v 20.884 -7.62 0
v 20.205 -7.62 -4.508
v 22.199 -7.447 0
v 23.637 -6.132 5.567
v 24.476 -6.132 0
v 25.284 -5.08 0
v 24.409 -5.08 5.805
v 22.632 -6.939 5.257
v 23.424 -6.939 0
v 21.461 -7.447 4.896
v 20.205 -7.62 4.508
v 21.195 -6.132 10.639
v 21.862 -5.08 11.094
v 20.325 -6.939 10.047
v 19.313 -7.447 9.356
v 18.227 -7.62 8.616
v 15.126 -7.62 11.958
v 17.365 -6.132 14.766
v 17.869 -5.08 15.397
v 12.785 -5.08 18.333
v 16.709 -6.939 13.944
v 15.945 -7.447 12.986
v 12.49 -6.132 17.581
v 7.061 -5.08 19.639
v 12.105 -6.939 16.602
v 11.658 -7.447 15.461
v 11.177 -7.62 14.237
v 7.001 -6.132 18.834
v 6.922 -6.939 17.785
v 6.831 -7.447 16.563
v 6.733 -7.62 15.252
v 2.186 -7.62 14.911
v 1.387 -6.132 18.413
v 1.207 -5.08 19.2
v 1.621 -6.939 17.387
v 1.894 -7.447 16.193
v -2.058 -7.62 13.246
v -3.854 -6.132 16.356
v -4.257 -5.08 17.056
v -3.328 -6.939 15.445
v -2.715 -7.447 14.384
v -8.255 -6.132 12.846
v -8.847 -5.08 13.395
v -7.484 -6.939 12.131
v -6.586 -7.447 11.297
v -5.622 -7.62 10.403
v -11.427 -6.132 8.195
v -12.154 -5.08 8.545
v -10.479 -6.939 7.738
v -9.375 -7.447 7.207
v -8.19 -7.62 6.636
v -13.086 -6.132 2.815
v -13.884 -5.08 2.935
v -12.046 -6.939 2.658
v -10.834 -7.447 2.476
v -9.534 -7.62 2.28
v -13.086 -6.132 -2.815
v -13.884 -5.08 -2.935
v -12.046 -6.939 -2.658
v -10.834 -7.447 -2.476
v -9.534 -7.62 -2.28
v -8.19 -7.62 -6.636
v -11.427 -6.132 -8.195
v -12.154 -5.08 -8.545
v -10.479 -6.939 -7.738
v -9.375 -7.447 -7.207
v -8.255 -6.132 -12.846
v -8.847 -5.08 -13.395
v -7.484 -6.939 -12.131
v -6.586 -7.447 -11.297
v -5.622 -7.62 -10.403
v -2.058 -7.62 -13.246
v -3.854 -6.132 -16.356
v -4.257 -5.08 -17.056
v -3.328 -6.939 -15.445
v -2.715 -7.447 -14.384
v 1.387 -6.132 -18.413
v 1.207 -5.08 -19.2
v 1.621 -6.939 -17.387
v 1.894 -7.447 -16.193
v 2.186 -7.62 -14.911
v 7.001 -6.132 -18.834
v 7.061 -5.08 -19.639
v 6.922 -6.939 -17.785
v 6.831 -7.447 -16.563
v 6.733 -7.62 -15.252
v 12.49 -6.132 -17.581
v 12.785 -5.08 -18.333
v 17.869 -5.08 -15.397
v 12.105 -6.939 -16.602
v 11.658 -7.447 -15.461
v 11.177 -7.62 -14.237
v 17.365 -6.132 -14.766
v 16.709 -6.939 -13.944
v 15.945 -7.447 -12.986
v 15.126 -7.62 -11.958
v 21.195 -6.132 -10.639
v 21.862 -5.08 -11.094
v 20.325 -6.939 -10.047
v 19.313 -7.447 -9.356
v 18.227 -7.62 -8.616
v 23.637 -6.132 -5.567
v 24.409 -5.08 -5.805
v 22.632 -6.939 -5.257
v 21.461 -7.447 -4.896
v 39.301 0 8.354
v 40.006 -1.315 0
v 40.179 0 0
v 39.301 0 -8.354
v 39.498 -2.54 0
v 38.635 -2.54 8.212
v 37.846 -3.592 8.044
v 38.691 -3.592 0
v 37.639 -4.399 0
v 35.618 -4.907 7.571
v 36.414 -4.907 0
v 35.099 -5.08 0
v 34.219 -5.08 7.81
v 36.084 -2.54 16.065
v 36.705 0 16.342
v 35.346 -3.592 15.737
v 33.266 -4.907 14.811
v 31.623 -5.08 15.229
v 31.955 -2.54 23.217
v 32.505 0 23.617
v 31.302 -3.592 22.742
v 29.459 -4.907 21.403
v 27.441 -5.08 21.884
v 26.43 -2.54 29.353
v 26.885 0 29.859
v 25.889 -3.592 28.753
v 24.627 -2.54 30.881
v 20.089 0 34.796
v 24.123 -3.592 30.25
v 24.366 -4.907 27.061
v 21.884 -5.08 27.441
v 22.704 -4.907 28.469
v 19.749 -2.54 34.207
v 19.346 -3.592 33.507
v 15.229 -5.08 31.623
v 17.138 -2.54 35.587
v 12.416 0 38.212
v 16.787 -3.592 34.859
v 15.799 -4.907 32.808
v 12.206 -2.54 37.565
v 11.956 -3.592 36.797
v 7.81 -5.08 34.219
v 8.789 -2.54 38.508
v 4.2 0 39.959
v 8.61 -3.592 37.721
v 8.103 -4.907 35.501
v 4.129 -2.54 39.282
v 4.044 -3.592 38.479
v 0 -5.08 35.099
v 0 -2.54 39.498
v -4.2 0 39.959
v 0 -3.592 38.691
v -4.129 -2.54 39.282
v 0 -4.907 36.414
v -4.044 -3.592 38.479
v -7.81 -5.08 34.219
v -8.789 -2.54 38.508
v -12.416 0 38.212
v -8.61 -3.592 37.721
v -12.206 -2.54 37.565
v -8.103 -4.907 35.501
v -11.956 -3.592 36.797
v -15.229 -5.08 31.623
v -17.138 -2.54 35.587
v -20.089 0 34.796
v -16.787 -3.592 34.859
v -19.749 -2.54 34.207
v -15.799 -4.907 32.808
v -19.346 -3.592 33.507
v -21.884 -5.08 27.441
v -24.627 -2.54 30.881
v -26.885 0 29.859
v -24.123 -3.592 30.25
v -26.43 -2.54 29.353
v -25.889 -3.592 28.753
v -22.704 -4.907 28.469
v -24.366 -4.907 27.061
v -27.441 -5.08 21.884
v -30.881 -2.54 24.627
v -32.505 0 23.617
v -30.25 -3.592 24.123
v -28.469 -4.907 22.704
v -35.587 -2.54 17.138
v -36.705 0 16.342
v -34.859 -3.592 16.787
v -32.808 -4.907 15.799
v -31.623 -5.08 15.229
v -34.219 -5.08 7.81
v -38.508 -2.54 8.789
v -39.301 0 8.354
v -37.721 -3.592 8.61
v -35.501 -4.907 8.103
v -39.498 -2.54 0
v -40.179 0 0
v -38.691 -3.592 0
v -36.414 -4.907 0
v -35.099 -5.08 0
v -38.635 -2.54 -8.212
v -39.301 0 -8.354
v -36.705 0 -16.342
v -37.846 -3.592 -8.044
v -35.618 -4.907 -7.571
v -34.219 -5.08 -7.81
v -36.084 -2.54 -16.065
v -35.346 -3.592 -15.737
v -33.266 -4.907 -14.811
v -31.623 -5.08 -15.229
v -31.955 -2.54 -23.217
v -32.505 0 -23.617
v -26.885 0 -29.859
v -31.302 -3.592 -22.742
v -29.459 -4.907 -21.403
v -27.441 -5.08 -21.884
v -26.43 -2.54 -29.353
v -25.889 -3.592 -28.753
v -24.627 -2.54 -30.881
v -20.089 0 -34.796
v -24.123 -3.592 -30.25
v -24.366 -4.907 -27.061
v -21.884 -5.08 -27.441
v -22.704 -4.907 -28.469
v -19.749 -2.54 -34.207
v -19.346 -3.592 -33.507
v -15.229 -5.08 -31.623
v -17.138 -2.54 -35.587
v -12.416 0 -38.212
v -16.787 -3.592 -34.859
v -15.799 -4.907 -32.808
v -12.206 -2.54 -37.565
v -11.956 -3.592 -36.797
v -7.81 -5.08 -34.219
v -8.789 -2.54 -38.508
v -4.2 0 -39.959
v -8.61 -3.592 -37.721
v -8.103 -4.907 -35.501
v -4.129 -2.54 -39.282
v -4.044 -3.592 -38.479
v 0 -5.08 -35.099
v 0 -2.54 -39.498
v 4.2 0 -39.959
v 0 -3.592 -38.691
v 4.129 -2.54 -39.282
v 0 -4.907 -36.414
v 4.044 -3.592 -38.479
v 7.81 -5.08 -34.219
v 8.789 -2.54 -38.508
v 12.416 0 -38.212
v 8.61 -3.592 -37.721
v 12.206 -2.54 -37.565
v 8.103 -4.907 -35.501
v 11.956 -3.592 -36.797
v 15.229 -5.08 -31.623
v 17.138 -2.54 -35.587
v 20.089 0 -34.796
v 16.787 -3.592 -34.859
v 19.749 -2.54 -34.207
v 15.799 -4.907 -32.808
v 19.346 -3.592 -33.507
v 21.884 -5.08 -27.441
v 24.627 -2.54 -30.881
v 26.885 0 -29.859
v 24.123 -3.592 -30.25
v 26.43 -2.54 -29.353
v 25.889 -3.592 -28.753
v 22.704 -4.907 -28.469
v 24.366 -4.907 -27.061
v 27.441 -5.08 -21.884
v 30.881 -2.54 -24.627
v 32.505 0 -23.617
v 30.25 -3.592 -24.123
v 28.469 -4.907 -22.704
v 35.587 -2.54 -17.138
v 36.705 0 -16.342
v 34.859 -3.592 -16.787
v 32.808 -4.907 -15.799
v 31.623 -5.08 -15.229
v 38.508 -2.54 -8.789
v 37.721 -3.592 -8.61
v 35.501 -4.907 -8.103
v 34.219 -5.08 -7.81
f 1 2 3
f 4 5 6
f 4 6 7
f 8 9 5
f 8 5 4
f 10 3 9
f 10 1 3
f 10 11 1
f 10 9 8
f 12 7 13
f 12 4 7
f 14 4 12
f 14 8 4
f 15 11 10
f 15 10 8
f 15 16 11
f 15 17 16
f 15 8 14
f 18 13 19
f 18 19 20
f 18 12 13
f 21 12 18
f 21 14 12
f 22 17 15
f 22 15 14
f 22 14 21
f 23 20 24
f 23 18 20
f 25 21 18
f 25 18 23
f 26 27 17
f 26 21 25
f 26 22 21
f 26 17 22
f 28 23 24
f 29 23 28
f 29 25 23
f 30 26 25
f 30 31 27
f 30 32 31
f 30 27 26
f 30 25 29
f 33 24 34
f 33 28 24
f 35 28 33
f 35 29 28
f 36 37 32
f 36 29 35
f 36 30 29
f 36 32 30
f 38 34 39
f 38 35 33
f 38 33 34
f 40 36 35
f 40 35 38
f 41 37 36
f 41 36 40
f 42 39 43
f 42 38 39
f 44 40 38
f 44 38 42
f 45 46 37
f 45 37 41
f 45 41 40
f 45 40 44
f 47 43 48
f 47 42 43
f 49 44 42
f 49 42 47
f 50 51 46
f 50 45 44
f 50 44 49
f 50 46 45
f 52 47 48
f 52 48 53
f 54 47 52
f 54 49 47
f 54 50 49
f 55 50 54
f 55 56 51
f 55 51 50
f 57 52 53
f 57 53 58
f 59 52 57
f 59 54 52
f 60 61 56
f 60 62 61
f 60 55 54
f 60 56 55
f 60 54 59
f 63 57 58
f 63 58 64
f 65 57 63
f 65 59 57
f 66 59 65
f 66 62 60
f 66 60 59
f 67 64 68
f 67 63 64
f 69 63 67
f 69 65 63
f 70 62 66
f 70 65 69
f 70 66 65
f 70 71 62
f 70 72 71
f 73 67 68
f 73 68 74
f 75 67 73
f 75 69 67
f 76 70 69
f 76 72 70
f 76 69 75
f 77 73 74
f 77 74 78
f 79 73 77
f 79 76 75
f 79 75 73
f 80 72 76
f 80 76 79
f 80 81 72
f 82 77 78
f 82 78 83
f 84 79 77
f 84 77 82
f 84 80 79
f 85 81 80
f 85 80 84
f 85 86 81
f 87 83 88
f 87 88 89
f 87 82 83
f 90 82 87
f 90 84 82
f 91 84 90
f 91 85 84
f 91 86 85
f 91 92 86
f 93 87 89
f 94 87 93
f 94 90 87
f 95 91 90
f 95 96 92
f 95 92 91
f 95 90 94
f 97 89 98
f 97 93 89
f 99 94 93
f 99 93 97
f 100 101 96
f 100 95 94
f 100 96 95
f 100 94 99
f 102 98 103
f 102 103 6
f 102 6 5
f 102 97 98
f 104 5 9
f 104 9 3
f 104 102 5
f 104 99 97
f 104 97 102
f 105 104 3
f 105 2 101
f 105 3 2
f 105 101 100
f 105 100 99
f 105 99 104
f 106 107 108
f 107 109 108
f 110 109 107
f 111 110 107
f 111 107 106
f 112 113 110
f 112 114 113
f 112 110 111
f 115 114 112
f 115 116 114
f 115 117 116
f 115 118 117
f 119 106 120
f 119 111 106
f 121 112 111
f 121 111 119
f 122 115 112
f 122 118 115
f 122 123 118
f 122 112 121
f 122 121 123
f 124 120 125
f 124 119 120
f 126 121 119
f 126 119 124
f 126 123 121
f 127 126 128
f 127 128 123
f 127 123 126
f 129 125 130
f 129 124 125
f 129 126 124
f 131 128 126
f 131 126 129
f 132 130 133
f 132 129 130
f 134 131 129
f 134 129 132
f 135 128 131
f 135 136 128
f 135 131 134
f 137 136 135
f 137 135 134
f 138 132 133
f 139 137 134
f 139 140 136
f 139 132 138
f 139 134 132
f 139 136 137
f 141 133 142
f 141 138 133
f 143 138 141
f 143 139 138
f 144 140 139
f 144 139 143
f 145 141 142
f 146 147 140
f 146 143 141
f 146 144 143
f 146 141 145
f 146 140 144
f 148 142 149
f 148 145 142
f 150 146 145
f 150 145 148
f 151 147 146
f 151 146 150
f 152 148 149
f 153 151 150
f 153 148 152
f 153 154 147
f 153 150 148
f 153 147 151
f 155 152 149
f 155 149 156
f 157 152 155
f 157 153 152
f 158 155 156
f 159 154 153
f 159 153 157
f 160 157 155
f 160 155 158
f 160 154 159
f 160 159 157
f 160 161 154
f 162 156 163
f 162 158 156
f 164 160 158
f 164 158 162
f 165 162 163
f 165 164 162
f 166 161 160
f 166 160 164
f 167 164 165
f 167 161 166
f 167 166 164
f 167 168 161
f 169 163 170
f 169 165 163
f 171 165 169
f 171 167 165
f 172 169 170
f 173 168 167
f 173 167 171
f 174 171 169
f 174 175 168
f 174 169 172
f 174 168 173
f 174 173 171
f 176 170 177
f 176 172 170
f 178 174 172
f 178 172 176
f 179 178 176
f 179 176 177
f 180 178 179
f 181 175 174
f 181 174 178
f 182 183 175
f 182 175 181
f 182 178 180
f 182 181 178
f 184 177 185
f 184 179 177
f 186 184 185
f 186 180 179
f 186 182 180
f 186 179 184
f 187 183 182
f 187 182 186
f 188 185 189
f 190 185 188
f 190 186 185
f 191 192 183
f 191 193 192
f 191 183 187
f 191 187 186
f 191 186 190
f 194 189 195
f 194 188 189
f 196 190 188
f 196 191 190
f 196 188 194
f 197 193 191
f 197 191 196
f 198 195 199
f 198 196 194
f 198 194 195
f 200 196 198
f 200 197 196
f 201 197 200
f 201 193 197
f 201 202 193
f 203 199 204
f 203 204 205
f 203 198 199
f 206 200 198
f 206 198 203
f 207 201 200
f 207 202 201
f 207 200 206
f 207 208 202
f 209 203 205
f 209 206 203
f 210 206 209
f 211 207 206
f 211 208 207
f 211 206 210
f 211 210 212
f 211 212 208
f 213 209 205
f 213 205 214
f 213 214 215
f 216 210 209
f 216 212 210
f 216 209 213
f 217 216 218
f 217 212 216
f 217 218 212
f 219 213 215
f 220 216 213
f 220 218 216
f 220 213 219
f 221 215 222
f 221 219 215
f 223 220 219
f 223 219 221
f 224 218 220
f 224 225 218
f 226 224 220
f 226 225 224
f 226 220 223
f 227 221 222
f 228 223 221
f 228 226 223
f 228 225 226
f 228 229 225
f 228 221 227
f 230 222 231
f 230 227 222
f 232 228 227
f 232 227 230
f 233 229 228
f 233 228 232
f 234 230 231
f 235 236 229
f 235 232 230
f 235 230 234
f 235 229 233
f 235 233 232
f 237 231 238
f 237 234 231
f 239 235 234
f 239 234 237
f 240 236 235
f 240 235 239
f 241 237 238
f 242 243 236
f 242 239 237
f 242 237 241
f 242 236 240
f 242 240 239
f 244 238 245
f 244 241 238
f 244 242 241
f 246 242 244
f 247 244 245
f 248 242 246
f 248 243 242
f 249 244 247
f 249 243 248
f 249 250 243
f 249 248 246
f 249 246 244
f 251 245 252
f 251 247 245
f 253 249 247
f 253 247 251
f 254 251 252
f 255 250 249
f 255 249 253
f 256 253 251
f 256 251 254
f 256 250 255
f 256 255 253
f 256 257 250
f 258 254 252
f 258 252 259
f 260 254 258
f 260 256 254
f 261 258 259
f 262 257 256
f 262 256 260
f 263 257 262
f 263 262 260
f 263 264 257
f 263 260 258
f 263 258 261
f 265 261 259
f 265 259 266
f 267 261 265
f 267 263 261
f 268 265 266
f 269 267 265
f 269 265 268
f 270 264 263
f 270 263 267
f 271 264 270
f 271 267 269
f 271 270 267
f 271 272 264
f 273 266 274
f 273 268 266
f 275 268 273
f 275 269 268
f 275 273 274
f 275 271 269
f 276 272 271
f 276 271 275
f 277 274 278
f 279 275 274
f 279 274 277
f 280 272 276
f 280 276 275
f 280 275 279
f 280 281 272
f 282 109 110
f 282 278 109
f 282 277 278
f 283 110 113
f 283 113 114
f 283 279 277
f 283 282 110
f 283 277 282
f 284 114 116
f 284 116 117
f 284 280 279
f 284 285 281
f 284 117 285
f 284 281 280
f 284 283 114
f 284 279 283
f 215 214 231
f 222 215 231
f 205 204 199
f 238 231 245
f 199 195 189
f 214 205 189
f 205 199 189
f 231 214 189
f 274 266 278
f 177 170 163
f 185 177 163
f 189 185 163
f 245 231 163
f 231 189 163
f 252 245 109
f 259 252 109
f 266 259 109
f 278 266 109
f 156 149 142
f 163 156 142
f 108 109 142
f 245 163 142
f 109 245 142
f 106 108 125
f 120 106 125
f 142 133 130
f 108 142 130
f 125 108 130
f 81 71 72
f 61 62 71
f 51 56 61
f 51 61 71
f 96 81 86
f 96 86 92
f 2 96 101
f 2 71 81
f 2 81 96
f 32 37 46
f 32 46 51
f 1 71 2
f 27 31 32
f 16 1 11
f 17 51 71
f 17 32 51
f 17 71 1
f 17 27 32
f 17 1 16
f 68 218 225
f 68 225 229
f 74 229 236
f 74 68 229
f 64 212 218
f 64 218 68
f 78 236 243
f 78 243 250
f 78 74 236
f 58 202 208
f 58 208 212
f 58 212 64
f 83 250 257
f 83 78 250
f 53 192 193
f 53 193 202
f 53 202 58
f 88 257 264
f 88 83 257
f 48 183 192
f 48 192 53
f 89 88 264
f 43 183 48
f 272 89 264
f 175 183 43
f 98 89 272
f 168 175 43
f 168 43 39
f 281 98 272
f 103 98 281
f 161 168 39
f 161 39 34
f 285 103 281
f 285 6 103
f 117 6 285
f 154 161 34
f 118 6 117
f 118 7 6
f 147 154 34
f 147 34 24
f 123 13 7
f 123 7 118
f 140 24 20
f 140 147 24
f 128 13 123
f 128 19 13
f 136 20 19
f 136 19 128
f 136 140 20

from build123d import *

# Parameters (mm, degrees)
F0_R     = 40.1789827743
F1_DEPTH = 5.08
F2_R     = 19.6940122024
F3_DEPTH = 2.54
F4_R     = 5.07999


# Not quite as in the source:
# - a fillet or chamfer that OpenCascade refuses, or shapes differently, is made with other operations: its cross-section is extruded or revolved along the edge and cut away or added
# - a fillet or chamfer is up to 0.001 mm smaller than in the source, because OpenCascade refuses the exact size


with BuildPart() as f1:
    # F0 (on Front) → F1 (new body)
    with BuildSketch(Plane.XZ):
        Circle(F0_R)
    extrude(amount=F1_DEPTH)

    # F2 (on face) → F3 (join)
    with BuildSketch(Plane.XZ.offset(5.08)):
        with Locations((5.5896993726, 0)):
            Circle(F2_R)
    extrude(amount=F3_DEPTH)

    # F4 (radius 5.08 in the source; OpenCascade refuses exactly that, so slightly less here)
    f4_edges = [f1.edges().sort_by_distance(p)[0] for p in [
        (-40.178983, -5.08, 0),
    ]]
    fillet(f4_edges, radius=F4_R)

    # F5: fillet of radius 5.08 on 1 edges, made by hand

    # F5_s1 → F5_t2 (revolve, cut)
    with BuildSketch(Plane.XY):
        with BuildLine():
            ThreePointArc((25.283711575, -5.08), (23.4243025238, -6.9394090512), (20.8843025238, -7.62))
            Line((20.8843025238, -7.62), (25.283711575, -7.62))
            Line((25.283711575, -7.62), (25.283711575, -5.08))
        make_face()
    revolve(axis=Axis((5.5896993726, -7.62, 0), (0, -1, 0)), mode=Mode.SUBTRACT)


solid = f1.part
